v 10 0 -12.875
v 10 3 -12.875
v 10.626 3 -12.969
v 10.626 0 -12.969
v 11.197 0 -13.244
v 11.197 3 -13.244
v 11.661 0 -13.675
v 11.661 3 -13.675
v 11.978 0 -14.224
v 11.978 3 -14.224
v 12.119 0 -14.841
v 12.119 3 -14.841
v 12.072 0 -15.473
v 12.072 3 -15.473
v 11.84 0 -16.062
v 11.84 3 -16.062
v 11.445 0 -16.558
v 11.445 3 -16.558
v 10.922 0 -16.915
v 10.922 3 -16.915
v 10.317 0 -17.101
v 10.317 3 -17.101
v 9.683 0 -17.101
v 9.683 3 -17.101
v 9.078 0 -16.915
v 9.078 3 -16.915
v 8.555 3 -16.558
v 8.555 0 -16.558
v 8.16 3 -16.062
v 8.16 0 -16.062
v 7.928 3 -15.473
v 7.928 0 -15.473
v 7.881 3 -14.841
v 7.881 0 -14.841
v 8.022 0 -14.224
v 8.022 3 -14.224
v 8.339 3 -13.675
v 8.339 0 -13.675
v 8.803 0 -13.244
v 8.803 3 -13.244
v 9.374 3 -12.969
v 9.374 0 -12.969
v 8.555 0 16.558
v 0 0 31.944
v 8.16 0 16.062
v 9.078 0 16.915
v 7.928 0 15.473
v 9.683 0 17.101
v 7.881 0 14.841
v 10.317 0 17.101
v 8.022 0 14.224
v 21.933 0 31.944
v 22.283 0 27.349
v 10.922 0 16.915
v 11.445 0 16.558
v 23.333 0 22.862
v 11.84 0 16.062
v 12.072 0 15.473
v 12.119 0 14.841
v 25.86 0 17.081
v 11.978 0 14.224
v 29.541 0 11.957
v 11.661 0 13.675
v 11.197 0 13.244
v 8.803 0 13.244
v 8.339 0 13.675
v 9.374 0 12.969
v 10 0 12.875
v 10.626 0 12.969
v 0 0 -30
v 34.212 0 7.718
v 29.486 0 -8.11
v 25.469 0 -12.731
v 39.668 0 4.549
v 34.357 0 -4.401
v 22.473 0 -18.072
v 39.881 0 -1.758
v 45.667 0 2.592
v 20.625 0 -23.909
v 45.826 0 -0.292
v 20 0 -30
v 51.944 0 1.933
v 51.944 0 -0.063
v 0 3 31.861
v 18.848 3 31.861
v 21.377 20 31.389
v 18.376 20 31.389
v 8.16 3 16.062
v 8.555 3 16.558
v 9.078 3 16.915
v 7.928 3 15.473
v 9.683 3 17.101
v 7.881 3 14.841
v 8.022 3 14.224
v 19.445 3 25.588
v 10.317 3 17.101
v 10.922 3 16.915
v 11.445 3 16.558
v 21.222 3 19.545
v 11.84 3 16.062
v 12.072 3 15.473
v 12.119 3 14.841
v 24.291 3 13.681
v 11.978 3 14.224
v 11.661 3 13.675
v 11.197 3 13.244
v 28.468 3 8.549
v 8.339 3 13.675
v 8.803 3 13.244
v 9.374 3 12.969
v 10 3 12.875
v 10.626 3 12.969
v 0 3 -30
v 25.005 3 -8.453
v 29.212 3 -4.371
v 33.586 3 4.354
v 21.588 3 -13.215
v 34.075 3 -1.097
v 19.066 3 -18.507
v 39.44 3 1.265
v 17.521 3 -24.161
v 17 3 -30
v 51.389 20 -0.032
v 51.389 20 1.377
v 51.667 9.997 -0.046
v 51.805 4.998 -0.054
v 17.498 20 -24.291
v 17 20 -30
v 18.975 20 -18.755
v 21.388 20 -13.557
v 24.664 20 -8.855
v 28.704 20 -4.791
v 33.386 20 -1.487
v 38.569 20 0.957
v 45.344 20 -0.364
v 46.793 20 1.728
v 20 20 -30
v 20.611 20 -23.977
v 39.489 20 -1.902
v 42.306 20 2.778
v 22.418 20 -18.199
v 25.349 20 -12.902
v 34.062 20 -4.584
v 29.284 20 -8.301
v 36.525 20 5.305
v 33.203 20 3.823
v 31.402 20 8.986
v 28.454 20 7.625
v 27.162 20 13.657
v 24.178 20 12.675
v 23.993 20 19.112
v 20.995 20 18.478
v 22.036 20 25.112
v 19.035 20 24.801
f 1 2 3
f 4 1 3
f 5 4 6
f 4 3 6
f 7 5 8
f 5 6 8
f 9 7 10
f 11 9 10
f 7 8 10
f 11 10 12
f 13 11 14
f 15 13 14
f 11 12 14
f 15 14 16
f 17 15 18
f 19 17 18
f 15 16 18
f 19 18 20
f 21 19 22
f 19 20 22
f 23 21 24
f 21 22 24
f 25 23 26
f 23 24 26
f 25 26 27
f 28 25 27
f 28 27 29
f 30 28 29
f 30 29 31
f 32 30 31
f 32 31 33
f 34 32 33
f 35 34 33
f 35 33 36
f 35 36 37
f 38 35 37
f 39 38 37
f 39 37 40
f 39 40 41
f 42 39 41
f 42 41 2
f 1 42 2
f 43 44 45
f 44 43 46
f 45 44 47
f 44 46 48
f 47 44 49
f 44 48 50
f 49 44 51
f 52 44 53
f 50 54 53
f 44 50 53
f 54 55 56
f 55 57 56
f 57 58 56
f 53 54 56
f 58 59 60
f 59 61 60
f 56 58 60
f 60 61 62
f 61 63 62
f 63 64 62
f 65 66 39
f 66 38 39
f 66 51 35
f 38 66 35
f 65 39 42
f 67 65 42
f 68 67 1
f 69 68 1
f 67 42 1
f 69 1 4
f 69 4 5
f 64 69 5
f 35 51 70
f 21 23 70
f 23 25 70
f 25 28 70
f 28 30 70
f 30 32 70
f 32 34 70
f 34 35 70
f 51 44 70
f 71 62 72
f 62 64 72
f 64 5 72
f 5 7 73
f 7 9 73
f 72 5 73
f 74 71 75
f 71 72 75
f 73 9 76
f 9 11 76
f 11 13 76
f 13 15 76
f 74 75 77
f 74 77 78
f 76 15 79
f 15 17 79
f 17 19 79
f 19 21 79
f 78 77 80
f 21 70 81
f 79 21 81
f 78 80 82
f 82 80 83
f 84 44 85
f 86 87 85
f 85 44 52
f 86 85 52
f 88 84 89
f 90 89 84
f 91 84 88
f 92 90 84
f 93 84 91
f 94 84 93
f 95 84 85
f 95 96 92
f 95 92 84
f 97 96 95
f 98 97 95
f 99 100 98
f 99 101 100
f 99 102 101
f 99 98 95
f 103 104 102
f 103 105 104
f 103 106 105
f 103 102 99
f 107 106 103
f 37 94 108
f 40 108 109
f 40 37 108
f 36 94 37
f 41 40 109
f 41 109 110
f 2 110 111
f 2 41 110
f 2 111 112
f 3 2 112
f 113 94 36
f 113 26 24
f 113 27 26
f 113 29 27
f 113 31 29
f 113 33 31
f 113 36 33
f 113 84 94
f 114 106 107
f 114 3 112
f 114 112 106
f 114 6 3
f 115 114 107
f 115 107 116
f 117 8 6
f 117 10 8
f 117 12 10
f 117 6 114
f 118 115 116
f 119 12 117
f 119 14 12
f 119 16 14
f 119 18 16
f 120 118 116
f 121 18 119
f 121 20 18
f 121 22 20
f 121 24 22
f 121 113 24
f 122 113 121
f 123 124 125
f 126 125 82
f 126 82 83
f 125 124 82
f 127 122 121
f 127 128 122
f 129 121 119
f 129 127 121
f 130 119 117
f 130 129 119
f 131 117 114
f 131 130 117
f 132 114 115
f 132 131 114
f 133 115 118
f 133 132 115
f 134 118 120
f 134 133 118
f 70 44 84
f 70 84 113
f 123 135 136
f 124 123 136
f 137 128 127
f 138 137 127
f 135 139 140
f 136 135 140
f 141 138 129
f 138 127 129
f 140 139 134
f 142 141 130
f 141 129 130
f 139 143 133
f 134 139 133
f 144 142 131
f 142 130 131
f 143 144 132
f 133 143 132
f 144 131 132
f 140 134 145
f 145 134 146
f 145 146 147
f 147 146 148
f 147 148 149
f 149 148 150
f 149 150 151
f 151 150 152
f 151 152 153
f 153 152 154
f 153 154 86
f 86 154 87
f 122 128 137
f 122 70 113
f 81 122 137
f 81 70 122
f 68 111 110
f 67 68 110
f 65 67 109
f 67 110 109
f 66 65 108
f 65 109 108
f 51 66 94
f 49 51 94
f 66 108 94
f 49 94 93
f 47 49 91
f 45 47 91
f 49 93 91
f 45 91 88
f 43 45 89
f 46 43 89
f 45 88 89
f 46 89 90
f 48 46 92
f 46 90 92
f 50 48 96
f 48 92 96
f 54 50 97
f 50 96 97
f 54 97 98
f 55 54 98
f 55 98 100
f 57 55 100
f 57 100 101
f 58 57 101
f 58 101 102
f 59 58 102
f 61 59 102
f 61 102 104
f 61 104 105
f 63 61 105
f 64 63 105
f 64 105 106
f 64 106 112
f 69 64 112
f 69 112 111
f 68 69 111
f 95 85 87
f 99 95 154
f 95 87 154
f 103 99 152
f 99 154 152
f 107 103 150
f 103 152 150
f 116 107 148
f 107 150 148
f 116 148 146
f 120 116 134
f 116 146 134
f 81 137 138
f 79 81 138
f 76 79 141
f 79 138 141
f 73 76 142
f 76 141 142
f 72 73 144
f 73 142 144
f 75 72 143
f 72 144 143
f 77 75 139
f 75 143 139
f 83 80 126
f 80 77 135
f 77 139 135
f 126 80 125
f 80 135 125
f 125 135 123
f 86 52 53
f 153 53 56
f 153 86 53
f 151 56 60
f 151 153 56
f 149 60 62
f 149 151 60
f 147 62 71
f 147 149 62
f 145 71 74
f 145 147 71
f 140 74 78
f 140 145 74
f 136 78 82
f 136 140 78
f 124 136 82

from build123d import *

# Parameters (mm, degrees)
SKETCH_1_W               = 50
SKETCH_1_H               = 60
EXTRUDE_1_DEPTH          = 70
DRAFT_1_ANGLE            = 1.591
CUT_EXTRUDE_1_DEPTH      = 72
CUT_EXTRUDE_1_DEPTH_BACK = 2
SKETCH_3_R               = 30
SKETCH_4_R               = 30
CUT_EXTRUDE_2_DEPTH      = 70
SKETCH_5_W               = 61.388766385
SKETCH_5_H               = 50
CUT_EXTRUDE_3_DEPTH      = 93.836652759
SHELL_1_T                = -3
SKETCH_6_R               = 2.125
CUT_EXTRUDE_4_DEPTH      = 64.305956024


with BuildPart() as part:
    # 草圖1 → 填料-伸長1 (new body)
    with BuildSketch(Plane(origin=(0, 0, 0), x_dir=(1, 0, 0), z_dir=(0, 1, 0))):
        with Locations((25, 0)):
            Rectangle(SKETCH_1_W, SKETCH_1_H)
    extrude(amount=EXTRUDE_1_DEPTH)

    # 拔模1
    draft_1_faces = [part.faces().sort_by_distance(p)[0] for p in [
        (50, 35, 0),
        (25, 35, 30),
    ]]
    draft(draft_1_faces, Plane.ZX.offset(70), DRAFT_1_ANGLE)

    # 草圖3 → 除料-伸長1 (cut, two sides: drawn at the far end of the back side and taken through both)
    with BuildSketch(Plane(origin=(50, 70, 30), x_dir=(0.9996147856379402, 0.02774322520612563, -0.0007705771714084017), z_dir=(0.02775392465967472, -0.9992294227713525, 0.027753924659674706)).offset(-CUT_EXTRUDE_1_DEPTH_BACK)):
        Circle(SKETCH_3_R)
    extrude(amount=CUT_EXTRUDE_1_DEPTH + CUT_EXTRUDE_1_DEPTH_BACK, mode=Mode.SUBTRACT)

    # 草圖4 → 除料-伸長2 (cut)
    with BuildSketch(Plane(origin=(0, 70, 0), x_dir=(1, 0, 0), z_dir=(0, 1, 0))):
        with Locations((50, 30)):
            Circle(SKETCH_4_R)
    extrude(amount=-CUT_EXTRUDE_2_DEPTH, mode=Mode.SUBTRACT)

    # 草圖5 → 除料-伸長3 (cut, through all)
    with BuildSketch(Plane.ZY):
        with Locations((0.694383192, 45)):
            Rectangle(SKETCH_5_W, SKETCH_5_H)
    extrude(amount=-CUT_EXTRUDE_3_DEPTH, mode=Mode.SUBTRACT)

    # 薄殼1
    shell_1_openings = [part.faces().sort_by_distance(p)[0] for p in [
        (14.866961876, 20, 1.073459526),
        (10, 10, -30),
        (10.828073147, 9.957245624, 31.667707178),
        (0, 9.984986274, 0.833468336),
    ]]
    offset(amount=SHELL_1_T, openings=shell_1_openings, kind=Kind.INTERSECTION)

    # 草圖6 → 除料-伸長4 (cut, through all)
    with BuildSketch(Plane(origin=(0, 3, 0), x_dir=(1, 0, 0), z_dir=(0, 1, 0))):
        with Locations(Location((10, 15, 0), (0, 0, 270))):
            Circle(SKETCH_6_R)
        with Locations(Location((10, -15, 0), (0, 0, 90))):
            Circle(SKETCH_6_R)
    extrude(amount=-CUT_EXTRUDE_4_DEPTH, mode=Mode.SUBTRACT)


solid = part.part
